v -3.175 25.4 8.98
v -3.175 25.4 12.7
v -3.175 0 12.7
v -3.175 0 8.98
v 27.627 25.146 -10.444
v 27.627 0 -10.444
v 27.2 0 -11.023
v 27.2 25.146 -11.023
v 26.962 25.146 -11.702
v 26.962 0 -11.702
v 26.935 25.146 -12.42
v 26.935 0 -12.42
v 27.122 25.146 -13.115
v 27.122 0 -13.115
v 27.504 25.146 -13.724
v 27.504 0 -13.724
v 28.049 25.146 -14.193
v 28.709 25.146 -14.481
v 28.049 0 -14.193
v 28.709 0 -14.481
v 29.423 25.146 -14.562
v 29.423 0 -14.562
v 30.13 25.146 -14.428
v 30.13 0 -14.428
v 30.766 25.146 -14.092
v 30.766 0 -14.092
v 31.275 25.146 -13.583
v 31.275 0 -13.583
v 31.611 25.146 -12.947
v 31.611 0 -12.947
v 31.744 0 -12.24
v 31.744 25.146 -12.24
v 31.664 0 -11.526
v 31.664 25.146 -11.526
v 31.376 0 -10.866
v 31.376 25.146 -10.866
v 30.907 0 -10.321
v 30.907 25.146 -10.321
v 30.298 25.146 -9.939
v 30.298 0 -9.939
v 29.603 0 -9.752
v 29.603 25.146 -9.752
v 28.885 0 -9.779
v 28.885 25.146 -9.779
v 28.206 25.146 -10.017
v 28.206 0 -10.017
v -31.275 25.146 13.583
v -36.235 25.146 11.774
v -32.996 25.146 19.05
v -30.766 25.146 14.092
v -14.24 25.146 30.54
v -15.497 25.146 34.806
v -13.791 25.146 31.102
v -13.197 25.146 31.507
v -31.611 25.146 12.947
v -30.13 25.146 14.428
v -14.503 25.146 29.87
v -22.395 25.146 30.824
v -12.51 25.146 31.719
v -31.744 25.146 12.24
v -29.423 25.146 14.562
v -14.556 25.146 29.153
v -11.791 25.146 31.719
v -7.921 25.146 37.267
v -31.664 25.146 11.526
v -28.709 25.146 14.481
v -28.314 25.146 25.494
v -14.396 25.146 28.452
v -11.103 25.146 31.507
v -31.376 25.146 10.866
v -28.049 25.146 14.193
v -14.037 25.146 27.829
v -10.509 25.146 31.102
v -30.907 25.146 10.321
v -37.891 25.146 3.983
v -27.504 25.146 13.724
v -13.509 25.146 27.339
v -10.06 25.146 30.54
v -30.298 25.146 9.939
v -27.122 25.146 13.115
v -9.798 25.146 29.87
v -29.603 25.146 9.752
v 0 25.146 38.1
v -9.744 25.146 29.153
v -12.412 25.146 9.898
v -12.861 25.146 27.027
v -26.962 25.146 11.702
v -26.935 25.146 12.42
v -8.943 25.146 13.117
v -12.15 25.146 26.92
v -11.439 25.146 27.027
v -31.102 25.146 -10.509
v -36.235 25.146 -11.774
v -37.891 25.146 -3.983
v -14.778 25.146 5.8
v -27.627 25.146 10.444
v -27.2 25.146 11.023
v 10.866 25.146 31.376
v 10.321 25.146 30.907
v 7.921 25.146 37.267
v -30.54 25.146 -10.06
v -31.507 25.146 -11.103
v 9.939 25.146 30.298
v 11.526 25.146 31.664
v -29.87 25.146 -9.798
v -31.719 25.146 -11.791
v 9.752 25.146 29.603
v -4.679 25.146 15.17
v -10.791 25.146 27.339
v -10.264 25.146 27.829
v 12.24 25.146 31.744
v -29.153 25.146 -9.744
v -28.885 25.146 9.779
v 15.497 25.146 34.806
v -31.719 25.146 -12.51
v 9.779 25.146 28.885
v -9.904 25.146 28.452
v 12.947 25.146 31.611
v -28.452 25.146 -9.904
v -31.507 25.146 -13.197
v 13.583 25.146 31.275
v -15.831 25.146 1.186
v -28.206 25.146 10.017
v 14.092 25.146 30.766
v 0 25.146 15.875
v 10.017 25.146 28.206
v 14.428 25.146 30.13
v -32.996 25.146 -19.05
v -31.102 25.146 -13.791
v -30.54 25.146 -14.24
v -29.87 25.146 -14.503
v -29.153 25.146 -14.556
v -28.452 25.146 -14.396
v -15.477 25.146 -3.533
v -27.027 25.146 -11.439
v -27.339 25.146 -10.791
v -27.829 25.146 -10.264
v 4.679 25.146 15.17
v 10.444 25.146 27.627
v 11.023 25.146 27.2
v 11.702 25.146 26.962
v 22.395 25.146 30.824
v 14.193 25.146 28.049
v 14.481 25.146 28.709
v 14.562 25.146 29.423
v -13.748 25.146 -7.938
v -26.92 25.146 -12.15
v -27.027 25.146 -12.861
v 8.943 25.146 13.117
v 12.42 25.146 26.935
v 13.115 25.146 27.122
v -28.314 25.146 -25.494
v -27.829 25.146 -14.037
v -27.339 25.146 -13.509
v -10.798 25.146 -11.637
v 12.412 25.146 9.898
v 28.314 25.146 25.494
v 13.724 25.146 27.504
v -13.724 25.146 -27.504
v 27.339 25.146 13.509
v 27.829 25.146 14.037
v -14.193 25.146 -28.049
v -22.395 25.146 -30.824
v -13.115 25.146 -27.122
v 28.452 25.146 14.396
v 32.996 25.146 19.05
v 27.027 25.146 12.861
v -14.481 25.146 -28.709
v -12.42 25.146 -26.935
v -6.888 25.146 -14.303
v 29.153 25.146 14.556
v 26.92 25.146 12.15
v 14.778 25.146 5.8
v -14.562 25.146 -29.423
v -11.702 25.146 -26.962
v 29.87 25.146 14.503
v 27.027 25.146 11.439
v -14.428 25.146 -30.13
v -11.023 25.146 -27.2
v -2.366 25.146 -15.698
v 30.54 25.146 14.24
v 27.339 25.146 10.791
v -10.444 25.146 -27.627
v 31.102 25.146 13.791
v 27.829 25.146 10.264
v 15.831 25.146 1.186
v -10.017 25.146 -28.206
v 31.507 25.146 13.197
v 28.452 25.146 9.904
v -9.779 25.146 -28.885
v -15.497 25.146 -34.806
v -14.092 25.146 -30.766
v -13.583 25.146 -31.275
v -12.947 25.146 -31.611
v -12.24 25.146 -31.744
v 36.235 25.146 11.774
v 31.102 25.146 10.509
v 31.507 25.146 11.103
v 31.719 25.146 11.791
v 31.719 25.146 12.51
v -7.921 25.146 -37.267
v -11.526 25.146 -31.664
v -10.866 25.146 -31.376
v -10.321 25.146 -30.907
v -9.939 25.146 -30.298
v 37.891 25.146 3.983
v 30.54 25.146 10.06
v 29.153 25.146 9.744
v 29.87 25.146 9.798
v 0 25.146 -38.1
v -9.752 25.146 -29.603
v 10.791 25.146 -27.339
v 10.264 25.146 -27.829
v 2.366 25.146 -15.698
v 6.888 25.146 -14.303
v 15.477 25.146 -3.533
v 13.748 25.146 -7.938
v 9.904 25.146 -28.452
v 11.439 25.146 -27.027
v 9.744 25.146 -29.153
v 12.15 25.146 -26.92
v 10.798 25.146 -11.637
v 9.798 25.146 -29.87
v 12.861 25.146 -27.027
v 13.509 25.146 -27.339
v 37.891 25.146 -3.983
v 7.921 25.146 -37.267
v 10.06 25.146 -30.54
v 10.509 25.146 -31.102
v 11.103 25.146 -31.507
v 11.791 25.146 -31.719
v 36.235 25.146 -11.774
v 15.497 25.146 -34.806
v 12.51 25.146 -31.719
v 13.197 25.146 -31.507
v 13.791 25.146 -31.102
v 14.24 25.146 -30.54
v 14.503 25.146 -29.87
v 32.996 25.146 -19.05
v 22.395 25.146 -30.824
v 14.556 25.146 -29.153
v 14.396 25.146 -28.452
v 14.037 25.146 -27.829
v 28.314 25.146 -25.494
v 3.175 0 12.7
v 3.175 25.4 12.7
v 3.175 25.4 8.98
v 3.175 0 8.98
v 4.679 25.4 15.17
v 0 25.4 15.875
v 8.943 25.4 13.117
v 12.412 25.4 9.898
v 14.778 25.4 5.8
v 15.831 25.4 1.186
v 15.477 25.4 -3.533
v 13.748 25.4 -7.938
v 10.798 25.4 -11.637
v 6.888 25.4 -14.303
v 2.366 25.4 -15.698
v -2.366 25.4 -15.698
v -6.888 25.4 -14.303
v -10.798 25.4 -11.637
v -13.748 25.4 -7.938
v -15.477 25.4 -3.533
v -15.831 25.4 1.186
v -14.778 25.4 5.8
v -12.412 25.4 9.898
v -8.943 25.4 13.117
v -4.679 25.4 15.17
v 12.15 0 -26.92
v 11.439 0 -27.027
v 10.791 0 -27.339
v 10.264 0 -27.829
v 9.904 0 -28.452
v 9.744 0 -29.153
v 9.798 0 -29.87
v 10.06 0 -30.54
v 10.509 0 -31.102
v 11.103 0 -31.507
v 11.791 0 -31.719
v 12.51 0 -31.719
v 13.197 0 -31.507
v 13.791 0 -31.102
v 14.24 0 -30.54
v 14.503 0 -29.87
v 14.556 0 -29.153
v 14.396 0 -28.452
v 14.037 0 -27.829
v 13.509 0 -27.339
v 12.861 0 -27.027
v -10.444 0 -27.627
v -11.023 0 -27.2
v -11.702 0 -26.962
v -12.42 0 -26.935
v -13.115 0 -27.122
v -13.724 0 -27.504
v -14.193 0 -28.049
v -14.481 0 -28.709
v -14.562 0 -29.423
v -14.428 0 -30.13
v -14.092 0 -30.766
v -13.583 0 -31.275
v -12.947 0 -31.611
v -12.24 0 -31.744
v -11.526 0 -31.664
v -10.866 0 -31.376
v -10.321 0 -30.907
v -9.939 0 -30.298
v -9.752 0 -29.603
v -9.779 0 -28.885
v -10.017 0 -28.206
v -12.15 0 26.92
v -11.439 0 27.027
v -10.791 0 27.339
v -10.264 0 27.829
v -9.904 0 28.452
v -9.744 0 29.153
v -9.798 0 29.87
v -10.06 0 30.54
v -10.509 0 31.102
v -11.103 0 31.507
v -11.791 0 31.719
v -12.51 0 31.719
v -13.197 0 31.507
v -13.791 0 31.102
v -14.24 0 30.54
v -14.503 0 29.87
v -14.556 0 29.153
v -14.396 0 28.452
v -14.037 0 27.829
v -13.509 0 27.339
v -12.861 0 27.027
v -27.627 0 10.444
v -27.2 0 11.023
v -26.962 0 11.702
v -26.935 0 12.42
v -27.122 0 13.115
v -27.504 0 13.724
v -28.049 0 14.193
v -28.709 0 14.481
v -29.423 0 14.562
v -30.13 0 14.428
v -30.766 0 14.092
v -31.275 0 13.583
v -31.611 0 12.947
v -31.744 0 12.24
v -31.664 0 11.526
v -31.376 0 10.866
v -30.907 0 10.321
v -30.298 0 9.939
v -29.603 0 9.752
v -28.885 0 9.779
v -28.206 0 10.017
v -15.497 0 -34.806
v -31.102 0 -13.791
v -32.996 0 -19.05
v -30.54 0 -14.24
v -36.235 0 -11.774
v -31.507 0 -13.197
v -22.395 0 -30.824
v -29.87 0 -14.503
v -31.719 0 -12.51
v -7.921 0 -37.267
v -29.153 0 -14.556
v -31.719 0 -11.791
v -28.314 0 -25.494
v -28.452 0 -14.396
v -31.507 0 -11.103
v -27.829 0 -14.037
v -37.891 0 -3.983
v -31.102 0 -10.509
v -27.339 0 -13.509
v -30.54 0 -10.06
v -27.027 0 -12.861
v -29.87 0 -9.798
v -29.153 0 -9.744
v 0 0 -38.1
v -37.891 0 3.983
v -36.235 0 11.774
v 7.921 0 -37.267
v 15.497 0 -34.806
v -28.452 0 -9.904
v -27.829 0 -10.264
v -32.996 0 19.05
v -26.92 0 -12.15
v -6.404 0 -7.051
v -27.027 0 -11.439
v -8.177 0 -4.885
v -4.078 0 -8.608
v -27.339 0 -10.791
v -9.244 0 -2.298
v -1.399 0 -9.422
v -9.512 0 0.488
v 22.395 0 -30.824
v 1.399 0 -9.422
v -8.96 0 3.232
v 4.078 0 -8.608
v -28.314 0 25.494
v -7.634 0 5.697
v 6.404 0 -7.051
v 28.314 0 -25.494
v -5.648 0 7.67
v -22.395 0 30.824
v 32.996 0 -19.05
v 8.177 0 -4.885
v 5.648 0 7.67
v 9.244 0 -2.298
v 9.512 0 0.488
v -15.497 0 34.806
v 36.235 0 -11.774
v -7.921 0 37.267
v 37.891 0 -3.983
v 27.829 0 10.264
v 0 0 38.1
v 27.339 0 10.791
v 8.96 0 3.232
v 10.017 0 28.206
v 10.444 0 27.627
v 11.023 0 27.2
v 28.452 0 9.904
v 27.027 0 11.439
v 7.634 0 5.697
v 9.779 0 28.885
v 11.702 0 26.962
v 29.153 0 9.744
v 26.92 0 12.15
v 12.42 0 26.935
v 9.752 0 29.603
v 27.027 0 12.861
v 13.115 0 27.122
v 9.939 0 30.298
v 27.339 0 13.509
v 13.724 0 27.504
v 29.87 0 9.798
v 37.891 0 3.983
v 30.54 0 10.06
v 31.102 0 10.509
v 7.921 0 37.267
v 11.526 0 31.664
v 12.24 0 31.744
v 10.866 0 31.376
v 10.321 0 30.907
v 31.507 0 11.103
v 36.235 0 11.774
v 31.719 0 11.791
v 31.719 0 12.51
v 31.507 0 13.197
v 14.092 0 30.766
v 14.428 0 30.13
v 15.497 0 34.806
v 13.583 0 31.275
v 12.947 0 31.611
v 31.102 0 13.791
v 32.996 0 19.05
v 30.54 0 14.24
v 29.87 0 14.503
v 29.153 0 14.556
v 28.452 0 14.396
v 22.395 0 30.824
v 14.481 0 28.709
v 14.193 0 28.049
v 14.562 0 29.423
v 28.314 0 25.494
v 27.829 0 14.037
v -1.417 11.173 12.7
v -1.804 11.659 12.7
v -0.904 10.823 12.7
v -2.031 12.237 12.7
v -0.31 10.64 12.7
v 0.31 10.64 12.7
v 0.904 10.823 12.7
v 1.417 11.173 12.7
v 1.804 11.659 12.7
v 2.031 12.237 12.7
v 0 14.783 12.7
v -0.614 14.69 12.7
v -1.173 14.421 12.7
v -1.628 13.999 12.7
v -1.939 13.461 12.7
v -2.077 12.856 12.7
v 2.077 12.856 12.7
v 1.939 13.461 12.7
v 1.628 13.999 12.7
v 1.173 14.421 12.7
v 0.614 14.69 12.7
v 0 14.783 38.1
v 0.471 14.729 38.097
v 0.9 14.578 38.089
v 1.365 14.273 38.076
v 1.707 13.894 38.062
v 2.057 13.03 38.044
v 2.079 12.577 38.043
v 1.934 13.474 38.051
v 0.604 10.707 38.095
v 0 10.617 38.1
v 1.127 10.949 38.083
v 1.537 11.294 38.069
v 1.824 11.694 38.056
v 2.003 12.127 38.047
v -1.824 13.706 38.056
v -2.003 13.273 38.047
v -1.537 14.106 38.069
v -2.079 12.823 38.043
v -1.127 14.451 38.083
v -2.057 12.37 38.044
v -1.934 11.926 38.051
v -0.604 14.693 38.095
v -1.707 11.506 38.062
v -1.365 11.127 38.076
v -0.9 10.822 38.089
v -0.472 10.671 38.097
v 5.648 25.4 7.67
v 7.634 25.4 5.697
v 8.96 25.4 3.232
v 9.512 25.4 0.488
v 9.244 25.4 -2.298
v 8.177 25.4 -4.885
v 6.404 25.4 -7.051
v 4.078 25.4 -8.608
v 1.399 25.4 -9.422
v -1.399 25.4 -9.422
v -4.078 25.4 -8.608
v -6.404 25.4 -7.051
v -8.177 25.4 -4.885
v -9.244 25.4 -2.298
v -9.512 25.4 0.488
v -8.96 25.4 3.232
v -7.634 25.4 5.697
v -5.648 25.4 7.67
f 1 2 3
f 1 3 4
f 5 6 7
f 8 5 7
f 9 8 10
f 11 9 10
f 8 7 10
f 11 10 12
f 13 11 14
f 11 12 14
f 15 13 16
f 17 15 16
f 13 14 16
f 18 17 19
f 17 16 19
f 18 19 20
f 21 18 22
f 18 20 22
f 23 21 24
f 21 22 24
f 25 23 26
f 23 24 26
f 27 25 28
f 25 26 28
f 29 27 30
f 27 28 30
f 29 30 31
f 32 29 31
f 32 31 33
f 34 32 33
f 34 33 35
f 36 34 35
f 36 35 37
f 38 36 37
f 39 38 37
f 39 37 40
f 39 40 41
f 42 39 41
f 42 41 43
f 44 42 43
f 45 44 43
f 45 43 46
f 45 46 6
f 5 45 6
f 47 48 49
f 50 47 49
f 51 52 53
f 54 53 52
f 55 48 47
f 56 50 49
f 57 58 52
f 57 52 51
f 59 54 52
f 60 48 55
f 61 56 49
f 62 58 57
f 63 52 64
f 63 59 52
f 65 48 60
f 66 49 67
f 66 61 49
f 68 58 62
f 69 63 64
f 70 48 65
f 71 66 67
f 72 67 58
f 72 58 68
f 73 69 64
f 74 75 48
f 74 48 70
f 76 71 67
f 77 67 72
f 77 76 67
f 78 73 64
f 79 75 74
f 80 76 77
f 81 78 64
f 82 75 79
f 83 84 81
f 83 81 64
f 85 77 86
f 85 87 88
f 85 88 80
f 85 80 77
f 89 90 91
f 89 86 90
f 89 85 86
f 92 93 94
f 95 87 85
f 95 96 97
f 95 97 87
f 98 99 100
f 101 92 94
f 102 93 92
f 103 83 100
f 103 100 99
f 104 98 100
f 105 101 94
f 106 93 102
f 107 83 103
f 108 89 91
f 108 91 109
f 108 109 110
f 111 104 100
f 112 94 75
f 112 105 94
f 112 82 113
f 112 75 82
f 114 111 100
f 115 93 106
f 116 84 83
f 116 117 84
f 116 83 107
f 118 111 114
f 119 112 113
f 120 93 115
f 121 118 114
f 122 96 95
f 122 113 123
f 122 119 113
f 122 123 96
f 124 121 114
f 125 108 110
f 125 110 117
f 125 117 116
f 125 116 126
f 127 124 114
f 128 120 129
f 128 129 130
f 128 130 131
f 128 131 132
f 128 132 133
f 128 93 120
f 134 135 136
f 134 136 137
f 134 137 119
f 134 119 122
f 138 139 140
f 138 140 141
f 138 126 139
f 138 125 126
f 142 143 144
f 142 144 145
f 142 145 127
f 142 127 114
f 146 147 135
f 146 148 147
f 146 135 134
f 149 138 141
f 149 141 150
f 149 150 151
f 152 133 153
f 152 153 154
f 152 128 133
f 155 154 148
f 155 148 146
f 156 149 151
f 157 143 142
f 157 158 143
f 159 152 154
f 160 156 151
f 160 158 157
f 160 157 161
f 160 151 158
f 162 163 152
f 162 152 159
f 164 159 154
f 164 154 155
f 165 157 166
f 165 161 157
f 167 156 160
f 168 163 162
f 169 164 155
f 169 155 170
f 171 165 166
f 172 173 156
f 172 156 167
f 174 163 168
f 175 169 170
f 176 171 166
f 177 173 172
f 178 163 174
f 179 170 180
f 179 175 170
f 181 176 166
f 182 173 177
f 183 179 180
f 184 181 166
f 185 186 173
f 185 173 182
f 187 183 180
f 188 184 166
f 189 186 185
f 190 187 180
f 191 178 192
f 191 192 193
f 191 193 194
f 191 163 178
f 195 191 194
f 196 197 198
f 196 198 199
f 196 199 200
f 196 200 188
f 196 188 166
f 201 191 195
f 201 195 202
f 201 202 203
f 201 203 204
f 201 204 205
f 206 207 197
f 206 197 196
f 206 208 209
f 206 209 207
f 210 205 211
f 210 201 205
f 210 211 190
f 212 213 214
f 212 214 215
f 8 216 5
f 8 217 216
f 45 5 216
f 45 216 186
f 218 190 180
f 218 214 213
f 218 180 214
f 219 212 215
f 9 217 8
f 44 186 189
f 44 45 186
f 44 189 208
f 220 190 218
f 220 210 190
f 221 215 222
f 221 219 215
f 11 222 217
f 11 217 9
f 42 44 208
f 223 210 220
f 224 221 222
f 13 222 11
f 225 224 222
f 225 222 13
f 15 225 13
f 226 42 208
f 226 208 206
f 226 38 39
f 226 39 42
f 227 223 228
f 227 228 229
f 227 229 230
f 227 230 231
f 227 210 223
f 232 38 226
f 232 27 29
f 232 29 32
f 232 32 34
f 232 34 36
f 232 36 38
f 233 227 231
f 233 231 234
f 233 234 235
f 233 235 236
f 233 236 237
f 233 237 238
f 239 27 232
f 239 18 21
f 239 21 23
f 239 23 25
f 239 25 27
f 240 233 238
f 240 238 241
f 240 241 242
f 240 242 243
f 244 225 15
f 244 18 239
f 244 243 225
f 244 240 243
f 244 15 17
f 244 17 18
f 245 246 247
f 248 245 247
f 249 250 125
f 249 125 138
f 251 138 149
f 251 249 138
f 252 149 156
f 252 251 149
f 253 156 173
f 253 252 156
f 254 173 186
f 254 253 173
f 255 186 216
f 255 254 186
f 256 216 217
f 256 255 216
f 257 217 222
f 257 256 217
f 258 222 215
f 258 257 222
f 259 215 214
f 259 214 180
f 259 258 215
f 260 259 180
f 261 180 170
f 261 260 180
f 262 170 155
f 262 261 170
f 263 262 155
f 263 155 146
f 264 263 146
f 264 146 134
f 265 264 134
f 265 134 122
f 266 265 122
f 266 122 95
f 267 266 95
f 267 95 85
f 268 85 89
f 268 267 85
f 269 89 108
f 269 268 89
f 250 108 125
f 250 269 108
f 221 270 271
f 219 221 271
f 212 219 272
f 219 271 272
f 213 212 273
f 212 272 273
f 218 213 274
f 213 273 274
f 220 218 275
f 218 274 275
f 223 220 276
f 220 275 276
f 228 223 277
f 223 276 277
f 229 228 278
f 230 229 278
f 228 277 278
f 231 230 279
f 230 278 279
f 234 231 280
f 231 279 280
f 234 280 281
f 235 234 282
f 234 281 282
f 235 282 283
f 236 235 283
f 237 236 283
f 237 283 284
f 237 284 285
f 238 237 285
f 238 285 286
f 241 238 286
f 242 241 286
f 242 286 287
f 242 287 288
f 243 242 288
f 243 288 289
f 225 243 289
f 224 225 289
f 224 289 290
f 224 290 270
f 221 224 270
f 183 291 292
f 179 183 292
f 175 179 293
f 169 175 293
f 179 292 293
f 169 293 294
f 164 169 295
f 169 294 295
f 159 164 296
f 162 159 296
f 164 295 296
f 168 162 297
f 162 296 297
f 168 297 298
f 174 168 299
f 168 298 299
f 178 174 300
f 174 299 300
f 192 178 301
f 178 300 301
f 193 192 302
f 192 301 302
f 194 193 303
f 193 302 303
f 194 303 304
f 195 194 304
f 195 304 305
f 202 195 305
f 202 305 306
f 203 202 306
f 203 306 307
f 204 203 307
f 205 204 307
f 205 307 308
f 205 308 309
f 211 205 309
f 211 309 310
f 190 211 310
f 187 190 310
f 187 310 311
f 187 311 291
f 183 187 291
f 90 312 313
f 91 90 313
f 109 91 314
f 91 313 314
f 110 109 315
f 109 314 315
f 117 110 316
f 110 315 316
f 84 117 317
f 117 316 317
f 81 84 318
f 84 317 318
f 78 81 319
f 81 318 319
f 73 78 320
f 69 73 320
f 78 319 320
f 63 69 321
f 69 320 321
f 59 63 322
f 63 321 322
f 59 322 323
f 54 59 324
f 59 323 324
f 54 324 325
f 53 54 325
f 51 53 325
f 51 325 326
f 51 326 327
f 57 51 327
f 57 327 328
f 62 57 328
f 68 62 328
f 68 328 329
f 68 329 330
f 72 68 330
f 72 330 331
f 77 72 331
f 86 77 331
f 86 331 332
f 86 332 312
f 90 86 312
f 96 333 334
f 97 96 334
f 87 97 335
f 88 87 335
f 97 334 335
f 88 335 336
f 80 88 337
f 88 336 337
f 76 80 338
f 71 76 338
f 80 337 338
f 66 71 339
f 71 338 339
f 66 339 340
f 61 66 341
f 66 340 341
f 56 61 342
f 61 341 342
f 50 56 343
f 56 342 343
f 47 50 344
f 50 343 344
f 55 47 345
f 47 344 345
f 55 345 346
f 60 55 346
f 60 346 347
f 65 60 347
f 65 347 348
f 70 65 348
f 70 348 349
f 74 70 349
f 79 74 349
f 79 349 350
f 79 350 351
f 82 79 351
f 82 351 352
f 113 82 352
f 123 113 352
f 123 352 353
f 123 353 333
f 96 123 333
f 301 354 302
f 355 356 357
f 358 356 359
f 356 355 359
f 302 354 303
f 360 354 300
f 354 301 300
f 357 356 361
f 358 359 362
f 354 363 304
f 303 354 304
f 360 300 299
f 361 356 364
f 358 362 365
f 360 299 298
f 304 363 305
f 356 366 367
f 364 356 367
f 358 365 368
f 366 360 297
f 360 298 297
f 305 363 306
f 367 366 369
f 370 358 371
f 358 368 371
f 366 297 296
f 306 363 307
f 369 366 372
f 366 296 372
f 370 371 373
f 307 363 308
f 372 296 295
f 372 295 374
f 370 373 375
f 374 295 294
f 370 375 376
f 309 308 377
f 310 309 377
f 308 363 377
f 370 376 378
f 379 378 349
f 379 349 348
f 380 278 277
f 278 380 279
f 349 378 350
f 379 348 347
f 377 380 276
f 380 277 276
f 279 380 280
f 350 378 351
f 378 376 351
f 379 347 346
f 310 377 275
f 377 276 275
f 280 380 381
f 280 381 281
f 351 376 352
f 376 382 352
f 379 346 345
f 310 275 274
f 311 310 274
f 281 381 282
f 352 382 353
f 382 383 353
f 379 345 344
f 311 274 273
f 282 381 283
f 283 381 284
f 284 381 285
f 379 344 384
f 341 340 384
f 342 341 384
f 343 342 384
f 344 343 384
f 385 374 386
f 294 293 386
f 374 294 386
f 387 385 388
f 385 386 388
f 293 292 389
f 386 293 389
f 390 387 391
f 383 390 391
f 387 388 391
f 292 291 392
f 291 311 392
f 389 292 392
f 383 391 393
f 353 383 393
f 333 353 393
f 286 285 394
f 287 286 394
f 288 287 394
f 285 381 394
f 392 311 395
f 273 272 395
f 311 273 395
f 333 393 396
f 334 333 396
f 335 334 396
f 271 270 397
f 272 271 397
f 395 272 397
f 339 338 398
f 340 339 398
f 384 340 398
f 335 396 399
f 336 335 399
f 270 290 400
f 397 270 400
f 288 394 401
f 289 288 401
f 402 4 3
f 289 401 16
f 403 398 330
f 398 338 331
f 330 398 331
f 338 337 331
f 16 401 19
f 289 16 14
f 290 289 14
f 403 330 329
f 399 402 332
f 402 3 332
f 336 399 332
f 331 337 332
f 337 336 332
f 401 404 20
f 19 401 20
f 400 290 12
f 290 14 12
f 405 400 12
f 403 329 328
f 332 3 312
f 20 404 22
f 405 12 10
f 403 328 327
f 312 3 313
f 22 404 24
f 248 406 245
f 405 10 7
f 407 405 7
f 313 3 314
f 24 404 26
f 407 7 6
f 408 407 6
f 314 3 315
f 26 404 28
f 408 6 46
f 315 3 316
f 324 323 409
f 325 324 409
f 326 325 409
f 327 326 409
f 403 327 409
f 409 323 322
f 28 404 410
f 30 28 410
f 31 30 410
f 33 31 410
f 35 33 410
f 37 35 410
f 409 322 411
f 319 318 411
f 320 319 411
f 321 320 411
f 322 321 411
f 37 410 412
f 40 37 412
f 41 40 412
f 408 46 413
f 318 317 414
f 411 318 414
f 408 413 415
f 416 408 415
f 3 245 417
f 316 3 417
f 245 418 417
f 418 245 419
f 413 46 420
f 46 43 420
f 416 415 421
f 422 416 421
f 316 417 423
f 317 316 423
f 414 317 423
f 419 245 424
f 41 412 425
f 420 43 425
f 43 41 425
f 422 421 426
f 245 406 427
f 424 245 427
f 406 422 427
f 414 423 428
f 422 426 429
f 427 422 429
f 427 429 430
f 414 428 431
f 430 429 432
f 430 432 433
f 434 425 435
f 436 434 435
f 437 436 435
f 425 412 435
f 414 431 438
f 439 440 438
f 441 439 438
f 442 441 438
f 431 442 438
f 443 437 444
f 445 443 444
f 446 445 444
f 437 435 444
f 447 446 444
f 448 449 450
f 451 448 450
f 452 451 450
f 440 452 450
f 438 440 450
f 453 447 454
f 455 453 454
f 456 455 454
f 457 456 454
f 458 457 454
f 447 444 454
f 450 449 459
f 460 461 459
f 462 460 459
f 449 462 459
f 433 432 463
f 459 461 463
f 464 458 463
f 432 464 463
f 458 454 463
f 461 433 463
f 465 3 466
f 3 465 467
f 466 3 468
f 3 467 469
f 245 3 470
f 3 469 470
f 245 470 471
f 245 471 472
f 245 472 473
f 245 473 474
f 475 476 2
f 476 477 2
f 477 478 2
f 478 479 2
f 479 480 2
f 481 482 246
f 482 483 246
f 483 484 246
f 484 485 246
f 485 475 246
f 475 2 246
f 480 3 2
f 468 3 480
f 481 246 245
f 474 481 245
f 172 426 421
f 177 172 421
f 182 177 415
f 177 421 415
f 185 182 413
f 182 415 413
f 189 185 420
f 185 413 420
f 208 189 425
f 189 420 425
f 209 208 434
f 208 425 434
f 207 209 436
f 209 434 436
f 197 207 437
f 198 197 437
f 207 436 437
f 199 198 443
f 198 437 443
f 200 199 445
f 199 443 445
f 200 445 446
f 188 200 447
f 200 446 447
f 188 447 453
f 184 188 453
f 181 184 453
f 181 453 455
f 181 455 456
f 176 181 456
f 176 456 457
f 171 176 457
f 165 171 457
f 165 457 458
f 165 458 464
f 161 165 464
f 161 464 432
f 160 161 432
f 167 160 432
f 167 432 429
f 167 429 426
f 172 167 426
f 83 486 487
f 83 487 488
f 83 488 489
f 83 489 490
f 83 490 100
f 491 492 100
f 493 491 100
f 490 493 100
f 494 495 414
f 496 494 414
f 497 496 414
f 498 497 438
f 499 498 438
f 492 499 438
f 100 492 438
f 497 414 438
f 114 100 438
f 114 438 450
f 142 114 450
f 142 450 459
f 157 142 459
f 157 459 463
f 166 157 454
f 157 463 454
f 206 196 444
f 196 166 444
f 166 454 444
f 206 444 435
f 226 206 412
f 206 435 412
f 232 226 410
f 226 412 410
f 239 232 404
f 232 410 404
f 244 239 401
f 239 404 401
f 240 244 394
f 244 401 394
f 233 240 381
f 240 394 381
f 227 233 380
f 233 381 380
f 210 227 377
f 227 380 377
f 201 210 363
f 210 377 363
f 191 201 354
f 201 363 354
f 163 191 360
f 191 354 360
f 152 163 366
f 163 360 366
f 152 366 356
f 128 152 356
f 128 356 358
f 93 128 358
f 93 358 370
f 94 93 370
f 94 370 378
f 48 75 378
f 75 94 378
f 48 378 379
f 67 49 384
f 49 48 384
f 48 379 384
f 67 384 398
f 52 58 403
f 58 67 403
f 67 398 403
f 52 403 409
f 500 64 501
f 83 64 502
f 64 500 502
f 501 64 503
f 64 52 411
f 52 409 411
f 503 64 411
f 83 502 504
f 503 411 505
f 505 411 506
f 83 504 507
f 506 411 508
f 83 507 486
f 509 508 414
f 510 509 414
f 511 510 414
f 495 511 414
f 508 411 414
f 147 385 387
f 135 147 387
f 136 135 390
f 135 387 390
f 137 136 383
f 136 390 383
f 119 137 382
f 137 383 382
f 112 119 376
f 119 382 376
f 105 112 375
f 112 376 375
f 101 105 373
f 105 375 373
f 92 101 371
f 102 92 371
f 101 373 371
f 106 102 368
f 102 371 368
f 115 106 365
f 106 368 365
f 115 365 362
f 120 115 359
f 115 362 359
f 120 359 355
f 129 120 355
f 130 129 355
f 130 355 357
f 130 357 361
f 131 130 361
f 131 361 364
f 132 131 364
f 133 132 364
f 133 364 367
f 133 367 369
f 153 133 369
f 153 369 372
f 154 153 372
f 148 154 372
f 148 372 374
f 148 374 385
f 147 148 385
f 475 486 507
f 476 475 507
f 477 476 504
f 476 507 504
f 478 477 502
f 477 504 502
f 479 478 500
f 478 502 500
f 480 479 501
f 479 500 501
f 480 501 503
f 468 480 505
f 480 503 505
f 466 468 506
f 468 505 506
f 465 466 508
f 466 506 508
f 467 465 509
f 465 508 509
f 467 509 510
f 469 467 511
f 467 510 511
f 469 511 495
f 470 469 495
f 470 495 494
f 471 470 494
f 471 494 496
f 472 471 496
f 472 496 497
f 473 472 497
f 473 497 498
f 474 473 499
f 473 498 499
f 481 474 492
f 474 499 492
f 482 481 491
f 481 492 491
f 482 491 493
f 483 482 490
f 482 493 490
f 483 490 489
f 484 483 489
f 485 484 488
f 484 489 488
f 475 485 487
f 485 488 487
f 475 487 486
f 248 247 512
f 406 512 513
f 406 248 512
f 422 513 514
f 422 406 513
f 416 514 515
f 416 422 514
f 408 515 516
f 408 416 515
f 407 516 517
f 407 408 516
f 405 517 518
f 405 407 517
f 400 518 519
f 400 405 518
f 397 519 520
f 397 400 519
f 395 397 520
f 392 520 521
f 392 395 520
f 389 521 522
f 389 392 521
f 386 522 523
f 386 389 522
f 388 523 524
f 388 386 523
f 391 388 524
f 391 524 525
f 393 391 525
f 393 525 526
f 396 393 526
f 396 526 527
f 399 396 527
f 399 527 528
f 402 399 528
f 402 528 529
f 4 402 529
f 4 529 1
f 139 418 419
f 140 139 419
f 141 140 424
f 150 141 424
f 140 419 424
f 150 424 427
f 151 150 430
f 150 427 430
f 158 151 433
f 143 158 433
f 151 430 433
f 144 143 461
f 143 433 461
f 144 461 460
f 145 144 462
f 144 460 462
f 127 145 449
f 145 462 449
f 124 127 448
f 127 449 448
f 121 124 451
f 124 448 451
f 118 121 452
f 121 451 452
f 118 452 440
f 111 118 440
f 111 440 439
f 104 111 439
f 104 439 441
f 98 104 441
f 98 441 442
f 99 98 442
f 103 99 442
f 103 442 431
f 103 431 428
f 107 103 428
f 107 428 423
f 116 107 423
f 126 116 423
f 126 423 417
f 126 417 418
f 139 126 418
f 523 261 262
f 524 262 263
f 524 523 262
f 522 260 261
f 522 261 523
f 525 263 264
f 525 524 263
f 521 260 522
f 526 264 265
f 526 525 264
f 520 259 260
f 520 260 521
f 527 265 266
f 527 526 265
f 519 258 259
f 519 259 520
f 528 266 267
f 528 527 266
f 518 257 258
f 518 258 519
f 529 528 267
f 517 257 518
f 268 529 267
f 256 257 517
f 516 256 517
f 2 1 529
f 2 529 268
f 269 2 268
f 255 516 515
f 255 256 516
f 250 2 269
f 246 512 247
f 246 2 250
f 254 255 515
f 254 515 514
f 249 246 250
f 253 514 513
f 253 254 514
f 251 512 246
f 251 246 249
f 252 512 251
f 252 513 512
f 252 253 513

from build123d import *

# Parameters (mm, degrees)
SKETCH1_R              = 38.1
SKETCH1_R_2            = 9.525
BOSS_EXTRUDE1_DEPTH    = 25.4
F_10_32_TAPPED_HOLE1_D = 4.826
CIRPATTERN1_COUNT      = 8
SKETCH4_W              = 6.35
SKETCH4_H              = 6.35
CUT_EXTRUDE1_DEPTH     = 60.56828015
SKETCH5_W              = 2.0828
SKETCH5_H              = 25.4
SKETCH7_OUTSIDE_W      = 100.344
SKETCH7_OUTSIDE_H      = 100.344
SKETCH7_OUTSIDE_R      = 15.875
CUT_EXTRUDE2_DEPTH     = 0.254


with BuildPart() as part:
    # Sketch1 → Boss-Extrude1 (new body)
    with BuildSketch(Plane(origin=(0, 0, 0), x_dir=(1, 0, 0), z_dir=(0, 1, 0))):
        with Locations(Location((0, 0, 0), (0, 0, 270))):
            Circle(SKETCH1_R)
        with Locations(Location((0, 0, 0), (0, 0, 270))):
            Circle(SKETCH1_R_2, mode=Mode.SUBTRACT)
    extrude(amount=BOSS_EXTRUDE1_DEPTH)

    # #10-32 Tapped Hole1 (through all)
    with Locations(Plane(origin=(0, 25.4, 0), x_dir=(-1, 0, 0), z_dir=(0, 1, 0))):
        with Locations((29.333175157, -12.150198978)):
            f_10_32_tapped_hole1 = Hole(F_10_32_TAPPED_HOLE1_D / 2)

    # CirPattern1: #10-32 Tapped Hole1 ×8 about axis
    cirpattern1_axis = Axis((0, 0, 0), (0, 1, 0))
    for i in range(1, CIRPATTERN1_COUNT):
        add(f_10_32_tapped_hole1.rotate(cirpattern1_axis, i * 360 / CIRPATTERN1_COUNT), mode=Mode.SUBTRACT)

    # Sketch4 → Cut-Extrude1 (cut, through all)
    with BuildSketch(Plane(origin=(0, 25.4, 0), x_dir=(1, 0, 0), z_dir=(0, 1, 0))):
        with Locations((0, -9.525)):
            Rectangle(SKETCH4_W, SKETCH4_H)
    extrude(amount=-CUT_EXTRUDE1_DEPTH, mode=Mode.SUBTRACT)

    # Sketch5 → #8-32 Tapped Hole1 (revolve, cut)
    with BuildSketch(Plane(origin=(0, 12.7, 12.7), x_dir=(0, 1, 0), z_dir=(1, 0, 0))):
        with Locations((1.0414, 12.7)):
            Rectangle(SKETCH5_W, SKETCH5_H)
    revolve(axis=Axis((0, 12.7, 6.35), (0, 0, 1)), mode=Mode.SUBTRACT)

    # Sketch7 outside → Cut-Extrude2 (cut)
    with BuildSketch(Plane(origin=(0, 25.4, 0), x_dir=(1, 0, 0), z_dir=(0, 1, 0))):
        Rectangle(SKETCH7_OUTSIDE_W, SKETCH7_OUTSIDE_H)
        with Locations(Location((0, 0, 0), (0, 0, 270))):
            Circle(SKETCH7_OUTSIDE_R, mode=Mode.SUBTRACT)
    extrude(amount=-CUT_EXTRUDE2_DEPTH, mode=Mode.SUBTRACT)


solid = part.part
